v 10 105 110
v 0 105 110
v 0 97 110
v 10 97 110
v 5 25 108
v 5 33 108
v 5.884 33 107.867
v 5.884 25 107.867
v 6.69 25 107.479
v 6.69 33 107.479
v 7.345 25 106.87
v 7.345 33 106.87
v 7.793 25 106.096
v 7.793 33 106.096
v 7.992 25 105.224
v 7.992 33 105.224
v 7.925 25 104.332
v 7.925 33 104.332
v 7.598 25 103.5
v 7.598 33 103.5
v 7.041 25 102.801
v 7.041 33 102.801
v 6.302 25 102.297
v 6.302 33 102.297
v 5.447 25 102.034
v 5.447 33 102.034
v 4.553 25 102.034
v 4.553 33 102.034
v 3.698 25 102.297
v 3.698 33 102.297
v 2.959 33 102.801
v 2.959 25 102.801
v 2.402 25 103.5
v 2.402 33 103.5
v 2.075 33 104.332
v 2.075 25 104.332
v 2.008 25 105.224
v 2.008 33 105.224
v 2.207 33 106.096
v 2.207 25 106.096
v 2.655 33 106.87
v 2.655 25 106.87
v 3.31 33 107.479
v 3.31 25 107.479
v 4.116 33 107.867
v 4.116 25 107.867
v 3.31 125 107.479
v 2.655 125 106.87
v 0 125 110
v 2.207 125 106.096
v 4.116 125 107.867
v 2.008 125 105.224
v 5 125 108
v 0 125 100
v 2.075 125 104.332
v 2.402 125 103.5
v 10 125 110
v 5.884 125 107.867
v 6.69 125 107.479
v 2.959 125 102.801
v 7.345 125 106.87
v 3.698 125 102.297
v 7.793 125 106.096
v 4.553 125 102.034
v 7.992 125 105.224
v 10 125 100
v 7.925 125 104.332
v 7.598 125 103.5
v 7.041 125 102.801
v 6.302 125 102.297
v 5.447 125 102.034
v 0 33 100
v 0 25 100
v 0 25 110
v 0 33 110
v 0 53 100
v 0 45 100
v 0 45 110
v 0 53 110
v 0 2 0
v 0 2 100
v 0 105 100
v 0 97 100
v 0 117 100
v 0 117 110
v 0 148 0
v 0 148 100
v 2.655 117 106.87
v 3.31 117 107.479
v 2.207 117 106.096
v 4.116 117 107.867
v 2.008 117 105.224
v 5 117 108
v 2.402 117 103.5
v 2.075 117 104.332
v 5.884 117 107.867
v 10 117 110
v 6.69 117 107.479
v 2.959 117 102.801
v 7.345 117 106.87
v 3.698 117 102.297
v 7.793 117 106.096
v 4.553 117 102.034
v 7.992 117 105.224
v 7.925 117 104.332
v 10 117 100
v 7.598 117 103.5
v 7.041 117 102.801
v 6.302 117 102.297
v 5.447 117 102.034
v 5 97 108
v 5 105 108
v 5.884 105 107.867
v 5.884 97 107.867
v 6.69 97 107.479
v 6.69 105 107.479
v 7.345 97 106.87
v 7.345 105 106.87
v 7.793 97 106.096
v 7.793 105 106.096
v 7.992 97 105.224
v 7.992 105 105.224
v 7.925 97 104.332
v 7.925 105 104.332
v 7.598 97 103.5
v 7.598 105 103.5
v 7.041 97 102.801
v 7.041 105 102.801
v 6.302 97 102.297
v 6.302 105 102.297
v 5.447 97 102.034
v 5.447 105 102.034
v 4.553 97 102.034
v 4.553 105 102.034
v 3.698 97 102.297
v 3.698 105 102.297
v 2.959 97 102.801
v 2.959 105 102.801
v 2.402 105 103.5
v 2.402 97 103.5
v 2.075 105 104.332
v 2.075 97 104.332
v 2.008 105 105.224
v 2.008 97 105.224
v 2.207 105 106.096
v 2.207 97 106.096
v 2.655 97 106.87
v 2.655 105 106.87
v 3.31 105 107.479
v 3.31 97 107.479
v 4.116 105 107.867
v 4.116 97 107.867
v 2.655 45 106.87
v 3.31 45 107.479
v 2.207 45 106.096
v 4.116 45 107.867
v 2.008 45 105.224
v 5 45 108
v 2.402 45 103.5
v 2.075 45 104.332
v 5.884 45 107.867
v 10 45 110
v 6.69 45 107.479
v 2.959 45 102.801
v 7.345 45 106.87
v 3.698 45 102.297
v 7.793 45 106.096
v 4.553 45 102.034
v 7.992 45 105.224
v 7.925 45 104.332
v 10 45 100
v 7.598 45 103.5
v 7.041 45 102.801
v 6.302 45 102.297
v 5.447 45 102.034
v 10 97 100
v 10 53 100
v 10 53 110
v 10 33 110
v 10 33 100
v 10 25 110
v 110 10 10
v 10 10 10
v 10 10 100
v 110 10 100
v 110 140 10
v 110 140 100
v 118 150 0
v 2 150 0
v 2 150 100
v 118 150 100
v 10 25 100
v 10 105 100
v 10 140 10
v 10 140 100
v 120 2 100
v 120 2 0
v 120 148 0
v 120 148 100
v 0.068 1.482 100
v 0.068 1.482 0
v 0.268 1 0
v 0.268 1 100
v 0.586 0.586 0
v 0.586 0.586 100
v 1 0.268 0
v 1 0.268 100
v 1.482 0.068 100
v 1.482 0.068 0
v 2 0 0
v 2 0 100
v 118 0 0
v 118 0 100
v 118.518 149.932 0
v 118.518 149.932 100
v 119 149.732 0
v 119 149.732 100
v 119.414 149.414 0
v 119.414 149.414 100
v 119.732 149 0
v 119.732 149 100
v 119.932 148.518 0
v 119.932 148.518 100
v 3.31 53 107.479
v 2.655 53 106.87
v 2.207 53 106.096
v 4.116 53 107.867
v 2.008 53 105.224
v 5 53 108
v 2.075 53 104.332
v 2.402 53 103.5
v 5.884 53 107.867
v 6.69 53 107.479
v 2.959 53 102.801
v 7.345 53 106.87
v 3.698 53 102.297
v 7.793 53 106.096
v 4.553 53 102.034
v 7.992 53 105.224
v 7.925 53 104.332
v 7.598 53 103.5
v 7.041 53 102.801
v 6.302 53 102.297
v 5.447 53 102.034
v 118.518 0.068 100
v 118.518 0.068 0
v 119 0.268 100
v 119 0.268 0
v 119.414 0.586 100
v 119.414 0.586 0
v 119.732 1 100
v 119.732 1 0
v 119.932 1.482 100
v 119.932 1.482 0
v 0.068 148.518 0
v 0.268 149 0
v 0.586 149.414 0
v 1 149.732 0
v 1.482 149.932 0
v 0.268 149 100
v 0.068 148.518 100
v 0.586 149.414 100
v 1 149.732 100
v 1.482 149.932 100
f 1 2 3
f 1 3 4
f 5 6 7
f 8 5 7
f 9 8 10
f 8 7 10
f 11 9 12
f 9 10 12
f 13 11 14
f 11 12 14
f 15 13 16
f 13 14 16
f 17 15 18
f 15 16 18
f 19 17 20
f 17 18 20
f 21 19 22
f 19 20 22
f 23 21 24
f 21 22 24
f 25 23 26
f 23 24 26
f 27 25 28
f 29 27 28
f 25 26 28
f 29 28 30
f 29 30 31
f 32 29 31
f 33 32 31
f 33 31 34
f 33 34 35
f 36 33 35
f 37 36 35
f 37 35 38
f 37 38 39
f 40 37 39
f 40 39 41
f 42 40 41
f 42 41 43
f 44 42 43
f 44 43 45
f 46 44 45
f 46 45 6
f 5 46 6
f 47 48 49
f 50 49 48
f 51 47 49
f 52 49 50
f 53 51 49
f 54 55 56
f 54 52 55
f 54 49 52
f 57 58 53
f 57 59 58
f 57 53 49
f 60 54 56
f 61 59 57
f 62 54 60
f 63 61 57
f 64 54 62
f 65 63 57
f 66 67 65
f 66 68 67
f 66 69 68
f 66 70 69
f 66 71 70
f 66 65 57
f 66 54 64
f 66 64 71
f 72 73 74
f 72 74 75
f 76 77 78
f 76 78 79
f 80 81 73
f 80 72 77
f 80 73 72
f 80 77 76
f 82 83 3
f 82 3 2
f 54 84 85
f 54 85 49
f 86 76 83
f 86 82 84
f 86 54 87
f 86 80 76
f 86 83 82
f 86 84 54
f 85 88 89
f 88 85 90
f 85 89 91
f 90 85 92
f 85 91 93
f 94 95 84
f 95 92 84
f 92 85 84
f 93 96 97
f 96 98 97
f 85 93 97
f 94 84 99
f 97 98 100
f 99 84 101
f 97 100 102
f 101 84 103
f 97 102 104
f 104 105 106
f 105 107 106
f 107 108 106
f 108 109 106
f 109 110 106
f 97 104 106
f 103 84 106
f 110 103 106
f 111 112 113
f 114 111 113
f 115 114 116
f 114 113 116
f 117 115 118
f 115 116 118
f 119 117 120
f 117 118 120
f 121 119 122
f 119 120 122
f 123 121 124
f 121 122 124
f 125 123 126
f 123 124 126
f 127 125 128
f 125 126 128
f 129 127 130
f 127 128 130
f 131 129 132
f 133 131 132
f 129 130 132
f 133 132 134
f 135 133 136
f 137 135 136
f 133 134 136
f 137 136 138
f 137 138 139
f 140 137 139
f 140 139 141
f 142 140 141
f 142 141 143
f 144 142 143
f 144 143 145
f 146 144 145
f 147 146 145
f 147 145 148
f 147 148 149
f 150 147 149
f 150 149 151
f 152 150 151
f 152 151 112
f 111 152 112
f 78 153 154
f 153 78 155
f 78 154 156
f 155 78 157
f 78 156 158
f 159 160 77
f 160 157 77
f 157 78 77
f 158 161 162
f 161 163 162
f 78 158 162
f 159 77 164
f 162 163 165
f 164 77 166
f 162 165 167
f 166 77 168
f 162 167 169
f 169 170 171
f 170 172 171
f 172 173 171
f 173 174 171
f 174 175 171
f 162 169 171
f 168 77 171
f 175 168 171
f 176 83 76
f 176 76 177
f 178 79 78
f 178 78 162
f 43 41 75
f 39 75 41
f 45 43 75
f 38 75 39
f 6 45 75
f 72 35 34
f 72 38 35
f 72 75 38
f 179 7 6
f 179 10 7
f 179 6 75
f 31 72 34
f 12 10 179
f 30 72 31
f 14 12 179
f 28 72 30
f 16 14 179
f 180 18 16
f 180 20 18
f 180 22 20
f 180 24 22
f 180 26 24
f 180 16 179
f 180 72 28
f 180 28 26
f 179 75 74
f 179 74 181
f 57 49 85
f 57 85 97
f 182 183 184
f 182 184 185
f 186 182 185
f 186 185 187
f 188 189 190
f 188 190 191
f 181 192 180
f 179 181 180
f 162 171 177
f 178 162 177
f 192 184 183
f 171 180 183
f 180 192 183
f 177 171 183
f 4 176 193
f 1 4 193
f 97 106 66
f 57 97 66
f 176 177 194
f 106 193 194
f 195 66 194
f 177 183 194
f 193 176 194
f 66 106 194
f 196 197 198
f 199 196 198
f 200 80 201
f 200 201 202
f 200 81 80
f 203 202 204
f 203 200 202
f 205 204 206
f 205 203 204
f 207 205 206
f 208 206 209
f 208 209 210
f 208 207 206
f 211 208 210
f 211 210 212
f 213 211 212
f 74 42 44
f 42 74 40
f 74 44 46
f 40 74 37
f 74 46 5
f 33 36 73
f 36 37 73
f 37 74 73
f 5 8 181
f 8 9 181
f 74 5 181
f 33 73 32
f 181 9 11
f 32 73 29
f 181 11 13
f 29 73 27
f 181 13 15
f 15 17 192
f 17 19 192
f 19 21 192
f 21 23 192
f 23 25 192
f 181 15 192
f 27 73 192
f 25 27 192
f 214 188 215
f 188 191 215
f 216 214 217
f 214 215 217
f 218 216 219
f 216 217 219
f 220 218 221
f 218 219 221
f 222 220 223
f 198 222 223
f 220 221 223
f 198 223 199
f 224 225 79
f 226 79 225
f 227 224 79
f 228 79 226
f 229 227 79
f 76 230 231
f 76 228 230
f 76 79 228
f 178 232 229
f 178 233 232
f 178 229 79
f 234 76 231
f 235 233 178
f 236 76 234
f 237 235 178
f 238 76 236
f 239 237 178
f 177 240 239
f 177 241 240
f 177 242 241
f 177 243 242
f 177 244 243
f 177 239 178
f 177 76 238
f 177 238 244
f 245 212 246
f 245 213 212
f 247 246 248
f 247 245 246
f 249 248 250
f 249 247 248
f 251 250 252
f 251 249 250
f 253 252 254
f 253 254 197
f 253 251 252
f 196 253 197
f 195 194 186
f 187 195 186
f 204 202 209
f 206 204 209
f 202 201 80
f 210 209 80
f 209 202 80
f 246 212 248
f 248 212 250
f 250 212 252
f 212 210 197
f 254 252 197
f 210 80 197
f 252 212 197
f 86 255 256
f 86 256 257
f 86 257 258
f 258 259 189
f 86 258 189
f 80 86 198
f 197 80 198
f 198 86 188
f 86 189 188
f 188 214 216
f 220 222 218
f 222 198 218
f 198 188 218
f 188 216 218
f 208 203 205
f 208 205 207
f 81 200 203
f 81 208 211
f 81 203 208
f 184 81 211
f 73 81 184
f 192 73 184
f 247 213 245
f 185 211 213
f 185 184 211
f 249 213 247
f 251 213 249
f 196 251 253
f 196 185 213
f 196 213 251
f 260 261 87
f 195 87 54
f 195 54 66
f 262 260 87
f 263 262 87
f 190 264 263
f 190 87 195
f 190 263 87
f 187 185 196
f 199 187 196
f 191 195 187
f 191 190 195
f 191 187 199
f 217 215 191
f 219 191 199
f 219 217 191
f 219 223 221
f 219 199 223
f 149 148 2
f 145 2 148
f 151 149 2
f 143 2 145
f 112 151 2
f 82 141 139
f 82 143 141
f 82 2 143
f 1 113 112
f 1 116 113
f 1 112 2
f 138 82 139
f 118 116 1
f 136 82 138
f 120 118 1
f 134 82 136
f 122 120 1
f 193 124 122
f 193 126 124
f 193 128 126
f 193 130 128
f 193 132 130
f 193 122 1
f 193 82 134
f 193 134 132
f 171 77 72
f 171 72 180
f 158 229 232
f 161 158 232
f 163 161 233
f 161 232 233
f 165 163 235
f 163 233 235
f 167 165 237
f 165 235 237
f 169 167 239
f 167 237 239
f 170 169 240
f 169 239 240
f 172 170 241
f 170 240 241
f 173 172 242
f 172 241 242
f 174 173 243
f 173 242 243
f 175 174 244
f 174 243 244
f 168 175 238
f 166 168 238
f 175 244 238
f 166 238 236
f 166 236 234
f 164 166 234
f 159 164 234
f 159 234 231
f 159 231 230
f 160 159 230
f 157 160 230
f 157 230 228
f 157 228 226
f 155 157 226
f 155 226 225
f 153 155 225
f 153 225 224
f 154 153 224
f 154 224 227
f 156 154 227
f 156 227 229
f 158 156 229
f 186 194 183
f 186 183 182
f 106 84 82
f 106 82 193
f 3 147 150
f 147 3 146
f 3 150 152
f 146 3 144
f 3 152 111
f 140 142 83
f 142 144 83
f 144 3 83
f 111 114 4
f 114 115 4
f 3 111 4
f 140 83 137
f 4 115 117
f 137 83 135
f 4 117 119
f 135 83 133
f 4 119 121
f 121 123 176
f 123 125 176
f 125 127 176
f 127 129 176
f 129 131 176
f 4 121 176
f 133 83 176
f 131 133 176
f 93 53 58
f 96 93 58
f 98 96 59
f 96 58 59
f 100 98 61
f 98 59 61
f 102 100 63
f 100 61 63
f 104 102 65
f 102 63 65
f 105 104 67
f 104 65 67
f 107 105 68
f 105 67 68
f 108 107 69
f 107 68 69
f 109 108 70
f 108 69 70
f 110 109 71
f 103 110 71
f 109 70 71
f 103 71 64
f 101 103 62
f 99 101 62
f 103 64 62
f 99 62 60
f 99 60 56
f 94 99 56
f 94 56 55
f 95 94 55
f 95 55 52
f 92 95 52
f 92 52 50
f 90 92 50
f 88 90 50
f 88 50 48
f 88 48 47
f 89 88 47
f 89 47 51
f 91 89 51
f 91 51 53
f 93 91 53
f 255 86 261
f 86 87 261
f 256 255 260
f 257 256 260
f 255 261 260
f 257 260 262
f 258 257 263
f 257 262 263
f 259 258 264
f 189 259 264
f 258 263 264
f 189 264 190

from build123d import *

# Parameters (mm, degrees)
SKETCH1_W           = 120
SKETCH1_H           = 150
BOSS_EXTRUDE1_DEPTH = 100
SHELL1_T            = -10
SKETCH2_W           = 10
SKETCH2_H           = 8
BOSS_EXTRUDE2_DEPTH = 10
SKETCH3_R           = 3
CUT_EXTRUDE1_DEPTH  = 206.243757518
FILLET1_R           = 2


with BuildPart() as part:
    # Sketch1 → Boss-Extrude1 (new body)
    with BuildSketch(Plane.XY):
        with Locations((60, 75)):
            Rectangle(SKETCH1_W, SKETCH1_H)
    extrude(amount=BOSS_EXTRUDE1_DEPTH)

    # Shell1
    shell1_openings = [part.faces().sort_by_distance(p)[0] for p in [
        (60, 75, 100),
    ]]
    offset(amount=SHELL1_T, openings=shell1_openings, kind=Kind.INTERSECTION)

    # Sketch2 → Boss-Extrude2 (add)
    with BuildSketch(Plane.XY.offset(100)):
        with Locations((5, 101)):
            Rectangle(SKETCH2_W, SKETCH2_H)
        with Locations((5, 121)):
            Rectangle(SKETCH2_W, SKETCH2_H)
        with Locations((5, 29)):
            Rectangle(SKETCH2_W, SKETCH2_H)
        with Locations((5, 49)):
            Rectangle(SKETCH2_W, SKETCH2_H)
    extrude(amount=BOSS_EXTRUDE2_DEPTH)

    # Sketch3 → Cut-Extrude1 (cut, through all)
    with BuildSketch(Plane(origin=(0, 125, 0), x_dir=(1, 0, 0), z_dir=(0, 1, 0))):
        with Locations(Location((5, -105, 0), (0, 0, 270))):
            Circle(SKETCH3_R)
    extrude(amount=-CUT_EXTRUDE1_DEPTH, mode=Mode.SUBTRACT)

    # Fillet1
    fillet1_edges = [part.edges().sort_by_distance(p)[0] for p in [
        (0, 150, 50),
        (120, 150, 50),
        (120, 0, 50),
        (0, 0, 50),
    ]]
    fillet(fillet1_edges, radius=FILLET1_R)


solid = part.part
